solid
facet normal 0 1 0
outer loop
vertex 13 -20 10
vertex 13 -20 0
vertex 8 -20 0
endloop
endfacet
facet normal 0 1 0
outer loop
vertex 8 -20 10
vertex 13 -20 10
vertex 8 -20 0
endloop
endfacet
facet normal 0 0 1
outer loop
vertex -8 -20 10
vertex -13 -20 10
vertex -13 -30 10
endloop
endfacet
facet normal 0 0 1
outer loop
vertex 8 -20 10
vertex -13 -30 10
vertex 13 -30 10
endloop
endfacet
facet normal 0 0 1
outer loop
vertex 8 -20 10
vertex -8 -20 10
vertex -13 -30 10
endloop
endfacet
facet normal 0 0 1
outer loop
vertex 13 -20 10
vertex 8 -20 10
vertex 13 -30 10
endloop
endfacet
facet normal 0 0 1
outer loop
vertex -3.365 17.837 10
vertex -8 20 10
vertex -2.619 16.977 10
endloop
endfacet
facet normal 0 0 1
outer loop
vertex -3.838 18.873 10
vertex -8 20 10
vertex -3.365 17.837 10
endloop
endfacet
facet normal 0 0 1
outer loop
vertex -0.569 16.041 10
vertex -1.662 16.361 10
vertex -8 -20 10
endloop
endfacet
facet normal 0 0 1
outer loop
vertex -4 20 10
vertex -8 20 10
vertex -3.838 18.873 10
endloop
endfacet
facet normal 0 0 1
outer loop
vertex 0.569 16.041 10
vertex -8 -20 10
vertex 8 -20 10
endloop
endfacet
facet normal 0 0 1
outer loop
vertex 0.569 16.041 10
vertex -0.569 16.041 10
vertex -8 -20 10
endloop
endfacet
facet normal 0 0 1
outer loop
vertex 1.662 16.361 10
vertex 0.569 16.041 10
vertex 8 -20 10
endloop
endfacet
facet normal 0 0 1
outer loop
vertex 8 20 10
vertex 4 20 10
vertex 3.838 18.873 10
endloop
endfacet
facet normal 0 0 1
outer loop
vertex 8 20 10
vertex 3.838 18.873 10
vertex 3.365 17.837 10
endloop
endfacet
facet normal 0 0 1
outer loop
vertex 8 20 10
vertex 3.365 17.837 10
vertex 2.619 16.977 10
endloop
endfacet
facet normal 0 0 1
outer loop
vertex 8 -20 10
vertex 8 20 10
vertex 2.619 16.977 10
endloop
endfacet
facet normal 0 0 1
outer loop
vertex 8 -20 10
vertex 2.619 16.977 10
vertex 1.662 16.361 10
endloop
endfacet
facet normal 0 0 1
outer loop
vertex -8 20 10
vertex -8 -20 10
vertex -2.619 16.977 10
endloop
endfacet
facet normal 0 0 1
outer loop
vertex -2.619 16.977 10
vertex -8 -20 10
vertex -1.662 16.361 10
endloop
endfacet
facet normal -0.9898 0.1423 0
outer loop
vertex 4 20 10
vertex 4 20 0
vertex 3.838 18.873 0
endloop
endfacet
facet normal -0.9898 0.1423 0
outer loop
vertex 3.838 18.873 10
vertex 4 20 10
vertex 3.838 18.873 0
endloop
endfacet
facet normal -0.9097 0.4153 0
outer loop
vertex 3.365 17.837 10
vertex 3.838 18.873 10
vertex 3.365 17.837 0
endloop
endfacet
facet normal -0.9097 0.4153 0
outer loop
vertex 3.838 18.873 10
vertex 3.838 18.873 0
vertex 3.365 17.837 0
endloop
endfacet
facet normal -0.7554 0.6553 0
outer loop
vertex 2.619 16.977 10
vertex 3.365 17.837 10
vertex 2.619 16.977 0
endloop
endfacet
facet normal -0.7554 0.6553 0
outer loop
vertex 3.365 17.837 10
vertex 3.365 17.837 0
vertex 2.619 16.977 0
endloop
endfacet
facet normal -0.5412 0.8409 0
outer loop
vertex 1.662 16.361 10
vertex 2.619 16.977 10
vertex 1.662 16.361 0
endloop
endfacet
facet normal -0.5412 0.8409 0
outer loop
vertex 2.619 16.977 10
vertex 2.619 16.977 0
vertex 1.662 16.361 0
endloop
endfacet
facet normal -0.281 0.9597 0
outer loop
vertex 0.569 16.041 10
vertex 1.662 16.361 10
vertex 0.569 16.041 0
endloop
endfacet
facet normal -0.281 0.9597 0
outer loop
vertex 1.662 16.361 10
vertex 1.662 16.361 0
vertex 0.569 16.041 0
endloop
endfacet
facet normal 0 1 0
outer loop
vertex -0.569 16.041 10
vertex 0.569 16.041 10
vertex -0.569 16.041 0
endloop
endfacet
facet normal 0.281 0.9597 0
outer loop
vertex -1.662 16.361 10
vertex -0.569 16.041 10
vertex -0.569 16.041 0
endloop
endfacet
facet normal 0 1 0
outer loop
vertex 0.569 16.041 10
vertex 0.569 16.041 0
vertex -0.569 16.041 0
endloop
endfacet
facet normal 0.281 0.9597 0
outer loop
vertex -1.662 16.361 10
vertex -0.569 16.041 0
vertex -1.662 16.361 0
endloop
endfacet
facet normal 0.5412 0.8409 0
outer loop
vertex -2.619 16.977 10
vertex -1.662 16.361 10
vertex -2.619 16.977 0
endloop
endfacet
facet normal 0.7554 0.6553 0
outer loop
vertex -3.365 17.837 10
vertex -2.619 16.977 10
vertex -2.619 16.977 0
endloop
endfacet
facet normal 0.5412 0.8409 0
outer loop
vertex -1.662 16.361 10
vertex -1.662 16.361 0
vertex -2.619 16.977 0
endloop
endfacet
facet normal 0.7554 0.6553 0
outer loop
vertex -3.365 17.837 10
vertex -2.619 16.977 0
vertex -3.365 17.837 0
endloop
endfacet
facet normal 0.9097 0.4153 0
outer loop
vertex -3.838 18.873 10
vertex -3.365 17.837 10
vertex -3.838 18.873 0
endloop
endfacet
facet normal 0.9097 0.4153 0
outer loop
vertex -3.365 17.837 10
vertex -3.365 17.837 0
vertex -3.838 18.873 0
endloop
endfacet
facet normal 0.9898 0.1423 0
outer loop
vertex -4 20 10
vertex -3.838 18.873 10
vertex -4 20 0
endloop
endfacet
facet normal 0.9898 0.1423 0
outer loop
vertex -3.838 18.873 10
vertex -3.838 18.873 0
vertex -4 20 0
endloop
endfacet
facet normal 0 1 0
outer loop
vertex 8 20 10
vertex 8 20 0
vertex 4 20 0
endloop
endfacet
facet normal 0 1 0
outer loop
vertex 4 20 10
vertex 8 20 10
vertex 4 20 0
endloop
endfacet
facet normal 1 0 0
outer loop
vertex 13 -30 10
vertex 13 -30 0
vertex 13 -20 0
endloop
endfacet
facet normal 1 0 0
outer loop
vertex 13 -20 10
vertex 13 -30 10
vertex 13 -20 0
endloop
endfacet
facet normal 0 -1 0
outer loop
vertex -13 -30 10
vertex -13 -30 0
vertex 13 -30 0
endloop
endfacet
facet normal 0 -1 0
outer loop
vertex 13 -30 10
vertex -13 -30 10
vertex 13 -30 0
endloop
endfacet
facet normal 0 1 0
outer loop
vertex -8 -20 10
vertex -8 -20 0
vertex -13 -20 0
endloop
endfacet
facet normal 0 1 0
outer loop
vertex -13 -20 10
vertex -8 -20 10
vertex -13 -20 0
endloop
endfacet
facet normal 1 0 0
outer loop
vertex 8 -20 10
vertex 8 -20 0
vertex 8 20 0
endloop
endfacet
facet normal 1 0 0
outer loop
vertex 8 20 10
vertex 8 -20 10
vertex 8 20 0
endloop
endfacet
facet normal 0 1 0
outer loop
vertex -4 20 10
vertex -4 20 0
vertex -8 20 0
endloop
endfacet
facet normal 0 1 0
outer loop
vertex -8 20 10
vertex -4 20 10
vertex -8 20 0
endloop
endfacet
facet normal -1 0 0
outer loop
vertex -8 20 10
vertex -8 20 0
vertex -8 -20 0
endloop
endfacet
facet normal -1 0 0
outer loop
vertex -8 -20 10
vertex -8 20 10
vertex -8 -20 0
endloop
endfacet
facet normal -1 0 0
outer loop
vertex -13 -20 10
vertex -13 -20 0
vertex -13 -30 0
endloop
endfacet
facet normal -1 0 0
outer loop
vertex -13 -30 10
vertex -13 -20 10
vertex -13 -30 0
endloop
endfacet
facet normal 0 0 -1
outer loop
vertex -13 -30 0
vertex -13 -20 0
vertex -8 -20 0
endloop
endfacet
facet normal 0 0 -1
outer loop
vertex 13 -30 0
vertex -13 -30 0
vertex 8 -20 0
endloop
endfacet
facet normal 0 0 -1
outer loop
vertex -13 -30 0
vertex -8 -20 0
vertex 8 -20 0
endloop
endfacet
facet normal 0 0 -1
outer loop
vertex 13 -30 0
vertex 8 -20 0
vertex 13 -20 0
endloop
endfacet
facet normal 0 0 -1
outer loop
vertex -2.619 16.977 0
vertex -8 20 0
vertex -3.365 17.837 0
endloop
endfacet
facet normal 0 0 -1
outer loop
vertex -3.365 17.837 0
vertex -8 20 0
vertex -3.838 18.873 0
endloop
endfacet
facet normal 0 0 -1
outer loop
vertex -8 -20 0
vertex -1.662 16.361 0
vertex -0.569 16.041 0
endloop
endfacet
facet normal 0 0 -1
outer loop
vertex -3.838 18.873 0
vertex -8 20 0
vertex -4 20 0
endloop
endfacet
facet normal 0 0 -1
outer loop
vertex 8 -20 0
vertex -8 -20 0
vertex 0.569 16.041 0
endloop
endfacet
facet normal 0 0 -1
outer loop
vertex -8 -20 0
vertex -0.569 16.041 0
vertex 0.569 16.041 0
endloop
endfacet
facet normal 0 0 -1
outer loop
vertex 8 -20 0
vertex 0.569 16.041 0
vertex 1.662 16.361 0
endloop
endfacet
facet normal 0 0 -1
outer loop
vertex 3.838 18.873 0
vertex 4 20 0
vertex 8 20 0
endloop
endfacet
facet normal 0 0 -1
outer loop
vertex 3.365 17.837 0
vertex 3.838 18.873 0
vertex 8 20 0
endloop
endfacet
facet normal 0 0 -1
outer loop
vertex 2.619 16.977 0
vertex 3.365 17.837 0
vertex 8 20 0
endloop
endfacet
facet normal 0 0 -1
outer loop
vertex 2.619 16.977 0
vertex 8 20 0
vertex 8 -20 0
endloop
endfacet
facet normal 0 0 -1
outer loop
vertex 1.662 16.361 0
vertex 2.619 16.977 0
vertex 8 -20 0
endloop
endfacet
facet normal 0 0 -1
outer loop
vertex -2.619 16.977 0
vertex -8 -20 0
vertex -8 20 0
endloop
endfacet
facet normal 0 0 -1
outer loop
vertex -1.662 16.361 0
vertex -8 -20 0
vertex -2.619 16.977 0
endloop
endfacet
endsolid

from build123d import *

# Parameters (mm, degrees)
F1_DEPTH = 10


with BuildPart() as f1:
    # F0 (on Top) → F1 (new body)
    with BuildSketch(Plane.XY):
        with BuildLine():
            Line((8, -20), (8, 20))
            Line((8, 20), (4, 20))
            ThreePointArc((4, 20), (0, 16), (-4, 20))
            Line((-4, 20), (-8, 20))
            Line((-8, 20), (-8, -20))
            Line((-8, -20), (-13, -20))
            Line((-13, -20), (-13, -30))
            Line((-13, -30), (13, -30))
            Line((13, -30), (13, -20))
            Line((13, -20), (8, -20))
        make_face()
    extrude(amount=F1_DEPTH)


solid = f1.part
